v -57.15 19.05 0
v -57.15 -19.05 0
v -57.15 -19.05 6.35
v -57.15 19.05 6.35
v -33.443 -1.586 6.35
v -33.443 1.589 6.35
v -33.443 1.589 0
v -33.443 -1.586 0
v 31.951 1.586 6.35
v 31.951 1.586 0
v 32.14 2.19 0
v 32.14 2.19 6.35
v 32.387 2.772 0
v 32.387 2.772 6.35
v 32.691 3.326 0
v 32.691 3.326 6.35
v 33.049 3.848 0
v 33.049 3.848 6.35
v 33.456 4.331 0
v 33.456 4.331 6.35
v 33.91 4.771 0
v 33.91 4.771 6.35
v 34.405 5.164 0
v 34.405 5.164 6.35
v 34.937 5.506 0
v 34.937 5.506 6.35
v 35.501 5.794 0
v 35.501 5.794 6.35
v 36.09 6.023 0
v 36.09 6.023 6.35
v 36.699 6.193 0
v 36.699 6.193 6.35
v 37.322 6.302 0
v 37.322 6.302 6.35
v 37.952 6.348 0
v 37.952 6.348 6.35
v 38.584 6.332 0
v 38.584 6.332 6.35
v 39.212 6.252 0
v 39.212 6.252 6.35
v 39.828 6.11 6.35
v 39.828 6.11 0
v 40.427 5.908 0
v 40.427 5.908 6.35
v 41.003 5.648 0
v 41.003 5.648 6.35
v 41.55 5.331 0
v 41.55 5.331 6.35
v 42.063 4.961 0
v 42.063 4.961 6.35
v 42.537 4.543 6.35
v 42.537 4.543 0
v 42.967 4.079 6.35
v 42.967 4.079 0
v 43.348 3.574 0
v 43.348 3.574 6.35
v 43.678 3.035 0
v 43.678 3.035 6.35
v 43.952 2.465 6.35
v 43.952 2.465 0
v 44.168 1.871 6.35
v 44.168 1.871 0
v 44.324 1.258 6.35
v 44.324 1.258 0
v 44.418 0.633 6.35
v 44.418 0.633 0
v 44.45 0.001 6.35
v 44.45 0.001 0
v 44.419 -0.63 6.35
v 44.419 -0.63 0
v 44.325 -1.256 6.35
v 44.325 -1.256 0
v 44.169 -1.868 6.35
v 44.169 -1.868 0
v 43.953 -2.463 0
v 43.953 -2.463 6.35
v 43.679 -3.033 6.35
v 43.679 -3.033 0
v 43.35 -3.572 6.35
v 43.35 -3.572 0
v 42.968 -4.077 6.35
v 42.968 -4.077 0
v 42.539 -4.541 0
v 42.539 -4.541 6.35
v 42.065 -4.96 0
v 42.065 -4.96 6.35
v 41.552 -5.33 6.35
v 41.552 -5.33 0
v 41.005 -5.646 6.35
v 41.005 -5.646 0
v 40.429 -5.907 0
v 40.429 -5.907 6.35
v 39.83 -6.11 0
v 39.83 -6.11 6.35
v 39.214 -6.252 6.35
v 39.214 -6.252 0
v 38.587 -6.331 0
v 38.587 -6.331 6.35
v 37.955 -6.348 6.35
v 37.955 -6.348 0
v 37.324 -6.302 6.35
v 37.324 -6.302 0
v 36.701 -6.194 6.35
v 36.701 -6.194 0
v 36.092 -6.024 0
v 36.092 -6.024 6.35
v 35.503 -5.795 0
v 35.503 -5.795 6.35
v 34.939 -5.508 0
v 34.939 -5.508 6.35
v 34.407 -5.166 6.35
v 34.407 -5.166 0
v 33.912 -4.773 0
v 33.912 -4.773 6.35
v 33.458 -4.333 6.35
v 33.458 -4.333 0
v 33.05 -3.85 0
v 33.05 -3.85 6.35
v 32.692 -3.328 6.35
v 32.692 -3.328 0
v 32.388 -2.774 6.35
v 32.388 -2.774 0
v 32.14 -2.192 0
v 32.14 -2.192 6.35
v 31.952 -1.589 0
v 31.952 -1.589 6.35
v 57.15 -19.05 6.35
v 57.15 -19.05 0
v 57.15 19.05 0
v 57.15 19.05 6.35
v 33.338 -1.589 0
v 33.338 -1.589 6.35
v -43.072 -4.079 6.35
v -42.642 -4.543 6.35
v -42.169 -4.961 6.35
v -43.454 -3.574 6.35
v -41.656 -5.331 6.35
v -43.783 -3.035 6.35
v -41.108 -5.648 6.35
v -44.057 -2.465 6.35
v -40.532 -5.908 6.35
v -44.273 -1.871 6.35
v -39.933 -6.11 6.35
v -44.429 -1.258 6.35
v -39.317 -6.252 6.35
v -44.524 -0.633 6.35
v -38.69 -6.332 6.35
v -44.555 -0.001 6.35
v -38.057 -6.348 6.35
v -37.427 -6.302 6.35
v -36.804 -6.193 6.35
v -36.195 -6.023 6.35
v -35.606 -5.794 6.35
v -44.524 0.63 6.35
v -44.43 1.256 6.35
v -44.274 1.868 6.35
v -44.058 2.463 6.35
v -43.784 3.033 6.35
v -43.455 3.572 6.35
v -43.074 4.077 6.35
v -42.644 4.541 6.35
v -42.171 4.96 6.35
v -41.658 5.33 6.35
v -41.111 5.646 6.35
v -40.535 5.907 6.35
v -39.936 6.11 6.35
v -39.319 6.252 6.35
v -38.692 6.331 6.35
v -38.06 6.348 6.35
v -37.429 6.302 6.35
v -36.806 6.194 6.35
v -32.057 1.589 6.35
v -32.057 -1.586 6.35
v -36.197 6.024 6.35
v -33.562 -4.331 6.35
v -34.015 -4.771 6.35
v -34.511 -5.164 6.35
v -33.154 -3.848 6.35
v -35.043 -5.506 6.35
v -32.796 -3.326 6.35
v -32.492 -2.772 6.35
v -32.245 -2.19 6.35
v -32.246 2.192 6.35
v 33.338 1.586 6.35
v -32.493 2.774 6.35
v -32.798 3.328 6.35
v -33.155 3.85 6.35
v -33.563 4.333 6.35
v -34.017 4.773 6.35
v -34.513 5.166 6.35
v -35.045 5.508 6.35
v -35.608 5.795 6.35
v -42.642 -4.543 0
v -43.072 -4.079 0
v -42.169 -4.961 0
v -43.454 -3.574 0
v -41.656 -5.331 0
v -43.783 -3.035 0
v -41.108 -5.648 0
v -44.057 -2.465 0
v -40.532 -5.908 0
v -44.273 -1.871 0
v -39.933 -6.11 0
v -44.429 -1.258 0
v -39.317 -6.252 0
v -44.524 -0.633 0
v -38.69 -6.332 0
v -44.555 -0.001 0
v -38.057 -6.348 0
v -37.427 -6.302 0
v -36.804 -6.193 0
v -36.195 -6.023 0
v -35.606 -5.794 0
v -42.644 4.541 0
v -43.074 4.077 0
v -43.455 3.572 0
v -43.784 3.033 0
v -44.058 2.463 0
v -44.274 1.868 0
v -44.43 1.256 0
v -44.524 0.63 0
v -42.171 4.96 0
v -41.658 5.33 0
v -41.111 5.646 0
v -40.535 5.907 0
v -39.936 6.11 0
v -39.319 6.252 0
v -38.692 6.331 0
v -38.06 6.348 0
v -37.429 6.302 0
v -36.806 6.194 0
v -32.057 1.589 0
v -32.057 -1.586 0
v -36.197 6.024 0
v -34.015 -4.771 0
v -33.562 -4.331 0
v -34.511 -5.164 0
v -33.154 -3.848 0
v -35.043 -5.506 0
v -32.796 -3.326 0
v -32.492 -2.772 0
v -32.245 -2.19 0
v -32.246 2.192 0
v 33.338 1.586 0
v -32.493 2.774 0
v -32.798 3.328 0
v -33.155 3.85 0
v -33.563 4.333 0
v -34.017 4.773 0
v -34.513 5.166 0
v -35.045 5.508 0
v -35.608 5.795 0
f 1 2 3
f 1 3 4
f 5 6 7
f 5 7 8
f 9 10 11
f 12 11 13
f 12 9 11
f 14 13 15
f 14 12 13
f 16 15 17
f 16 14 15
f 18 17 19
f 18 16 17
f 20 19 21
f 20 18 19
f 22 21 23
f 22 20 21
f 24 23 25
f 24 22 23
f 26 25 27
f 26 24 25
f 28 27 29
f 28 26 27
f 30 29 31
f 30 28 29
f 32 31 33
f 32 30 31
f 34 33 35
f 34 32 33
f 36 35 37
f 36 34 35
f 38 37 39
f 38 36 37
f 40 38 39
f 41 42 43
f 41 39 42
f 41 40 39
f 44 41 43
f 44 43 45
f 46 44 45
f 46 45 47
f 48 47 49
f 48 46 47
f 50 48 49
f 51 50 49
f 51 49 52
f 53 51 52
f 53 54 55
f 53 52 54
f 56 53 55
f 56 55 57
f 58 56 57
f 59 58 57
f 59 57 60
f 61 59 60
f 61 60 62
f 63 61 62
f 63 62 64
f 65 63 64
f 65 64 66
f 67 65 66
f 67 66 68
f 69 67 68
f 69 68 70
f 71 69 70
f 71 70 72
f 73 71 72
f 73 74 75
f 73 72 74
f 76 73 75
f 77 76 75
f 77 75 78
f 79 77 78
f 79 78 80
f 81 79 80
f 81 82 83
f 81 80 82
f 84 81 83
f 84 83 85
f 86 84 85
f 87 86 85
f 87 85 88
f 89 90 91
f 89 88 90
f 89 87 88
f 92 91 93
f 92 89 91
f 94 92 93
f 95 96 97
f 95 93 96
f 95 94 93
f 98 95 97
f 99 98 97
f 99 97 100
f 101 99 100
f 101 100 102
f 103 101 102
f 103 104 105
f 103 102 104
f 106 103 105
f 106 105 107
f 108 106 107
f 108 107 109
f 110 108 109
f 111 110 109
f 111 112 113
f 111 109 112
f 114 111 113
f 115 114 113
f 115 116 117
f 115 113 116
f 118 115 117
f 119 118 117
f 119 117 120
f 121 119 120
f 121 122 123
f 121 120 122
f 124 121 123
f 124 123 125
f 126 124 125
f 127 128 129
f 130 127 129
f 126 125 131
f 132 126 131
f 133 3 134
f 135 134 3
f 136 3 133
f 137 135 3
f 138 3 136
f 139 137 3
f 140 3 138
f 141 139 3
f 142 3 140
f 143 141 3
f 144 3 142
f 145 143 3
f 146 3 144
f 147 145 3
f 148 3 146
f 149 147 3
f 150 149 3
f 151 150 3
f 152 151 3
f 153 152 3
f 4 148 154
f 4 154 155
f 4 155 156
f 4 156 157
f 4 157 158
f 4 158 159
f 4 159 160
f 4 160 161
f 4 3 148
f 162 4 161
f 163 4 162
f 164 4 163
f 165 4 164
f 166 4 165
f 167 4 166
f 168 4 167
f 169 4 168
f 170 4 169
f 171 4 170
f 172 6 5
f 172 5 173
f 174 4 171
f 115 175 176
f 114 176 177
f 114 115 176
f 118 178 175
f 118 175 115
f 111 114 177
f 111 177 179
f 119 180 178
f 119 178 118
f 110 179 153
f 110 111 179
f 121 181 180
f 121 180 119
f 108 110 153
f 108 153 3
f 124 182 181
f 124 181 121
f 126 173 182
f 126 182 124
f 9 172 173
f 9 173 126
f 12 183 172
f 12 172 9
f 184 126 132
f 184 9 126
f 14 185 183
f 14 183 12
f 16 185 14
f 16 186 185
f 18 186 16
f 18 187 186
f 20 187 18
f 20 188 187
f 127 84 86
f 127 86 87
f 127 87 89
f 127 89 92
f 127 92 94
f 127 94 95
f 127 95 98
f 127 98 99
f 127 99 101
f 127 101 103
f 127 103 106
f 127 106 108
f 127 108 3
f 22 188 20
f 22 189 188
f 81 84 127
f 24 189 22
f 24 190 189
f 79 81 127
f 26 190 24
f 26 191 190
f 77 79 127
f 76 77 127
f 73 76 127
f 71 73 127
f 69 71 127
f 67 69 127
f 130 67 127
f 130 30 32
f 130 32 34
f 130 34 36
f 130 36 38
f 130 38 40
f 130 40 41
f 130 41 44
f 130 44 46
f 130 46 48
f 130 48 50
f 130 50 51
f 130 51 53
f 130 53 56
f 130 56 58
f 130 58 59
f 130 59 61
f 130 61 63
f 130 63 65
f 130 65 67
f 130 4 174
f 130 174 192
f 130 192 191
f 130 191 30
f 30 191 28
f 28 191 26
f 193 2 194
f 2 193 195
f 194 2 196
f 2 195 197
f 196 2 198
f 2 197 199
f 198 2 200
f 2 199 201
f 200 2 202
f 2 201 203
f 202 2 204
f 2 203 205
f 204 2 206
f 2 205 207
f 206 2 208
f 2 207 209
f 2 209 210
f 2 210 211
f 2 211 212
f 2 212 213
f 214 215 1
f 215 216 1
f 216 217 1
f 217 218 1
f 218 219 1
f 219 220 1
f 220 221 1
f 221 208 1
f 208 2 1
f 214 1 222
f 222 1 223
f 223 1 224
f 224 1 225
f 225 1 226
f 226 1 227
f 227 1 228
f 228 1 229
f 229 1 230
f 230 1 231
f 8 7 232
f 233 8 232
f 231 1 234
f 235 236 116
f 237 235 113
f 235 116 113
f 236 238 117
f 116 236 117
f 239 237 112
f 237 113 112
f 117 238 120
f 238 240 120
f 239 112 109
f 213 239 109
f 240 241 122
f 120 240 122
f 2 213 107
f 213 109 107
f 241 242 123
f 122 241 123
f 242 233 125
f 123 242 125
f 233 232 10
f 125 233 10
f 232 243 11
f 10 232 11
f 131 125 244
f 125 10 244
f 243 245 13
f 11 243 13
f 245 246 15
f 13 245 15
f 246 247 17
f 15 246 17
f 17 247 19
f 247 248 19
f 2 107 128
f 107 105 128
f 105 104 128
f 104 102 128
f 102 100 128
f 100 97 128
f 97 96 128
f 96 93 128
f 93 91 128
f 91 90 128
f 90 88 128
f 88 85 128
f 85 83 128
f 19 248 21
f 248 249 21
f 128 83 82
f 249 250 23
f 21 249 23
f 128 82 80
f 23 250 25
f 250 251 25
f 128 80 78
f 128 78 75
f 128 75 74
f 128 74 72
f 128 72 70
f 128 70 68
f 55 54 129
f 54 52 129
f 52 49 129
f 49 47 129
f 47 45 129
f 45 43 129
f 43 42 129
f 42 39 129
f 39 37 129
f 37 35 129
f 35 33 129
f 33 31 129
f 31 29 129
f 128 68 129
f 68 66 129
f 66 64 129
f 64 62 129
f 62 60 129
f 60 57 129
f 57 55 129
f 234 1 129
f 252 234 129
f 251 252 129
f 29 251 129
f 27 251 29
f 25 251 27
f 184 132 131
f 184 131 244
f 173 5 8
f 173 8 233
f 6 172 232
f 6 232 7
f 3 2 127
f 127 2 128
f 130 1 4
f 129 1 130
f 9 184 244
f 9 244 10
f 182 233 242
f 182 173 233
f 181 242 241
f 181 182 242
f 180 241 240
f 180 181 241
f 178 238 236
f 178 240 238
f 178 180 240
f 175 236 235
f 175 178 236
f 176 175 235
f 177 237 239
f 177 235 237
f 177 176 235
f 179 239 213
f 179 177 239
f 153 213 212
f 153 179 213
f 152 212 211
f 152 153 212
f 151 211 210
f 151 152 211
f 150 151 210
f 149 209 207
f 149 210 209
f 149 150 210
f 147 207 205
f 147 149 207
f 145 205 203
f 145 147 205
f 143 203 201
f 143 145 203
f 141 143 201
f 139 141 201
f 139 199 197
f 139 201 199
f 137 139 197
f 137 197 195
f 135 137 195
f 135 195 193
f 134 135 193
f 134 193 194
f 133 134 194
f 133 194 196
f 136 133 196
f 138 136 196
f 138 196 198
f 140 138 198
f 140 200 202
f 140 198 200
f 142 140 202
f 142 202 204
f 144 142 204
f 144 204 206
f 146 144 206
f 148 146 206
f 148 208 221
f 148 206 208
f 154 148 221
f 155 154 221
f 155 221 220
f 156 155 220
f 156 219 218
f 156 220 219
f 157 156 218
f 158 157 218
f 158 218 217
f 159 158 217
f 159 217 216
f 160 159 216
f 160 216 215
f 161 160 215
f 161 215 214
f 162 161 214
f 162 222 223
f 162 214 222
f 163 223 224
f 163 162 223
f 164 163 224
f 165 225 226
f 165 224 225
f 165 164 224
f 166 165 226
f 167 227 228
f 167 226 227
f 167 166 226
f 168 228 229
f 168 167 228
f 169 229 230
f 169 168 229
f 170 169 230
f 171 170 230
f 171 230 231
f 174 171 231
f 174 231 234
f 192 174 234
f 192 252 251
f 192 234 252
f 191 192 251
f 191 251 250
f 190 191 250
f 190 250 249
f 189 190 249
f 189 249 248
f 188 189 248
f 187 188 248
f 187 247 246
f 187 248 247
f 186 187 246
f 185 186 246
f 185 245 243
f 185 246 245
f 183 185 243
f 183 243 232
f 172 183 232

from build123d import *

# Parameters (mm, degrees)
SKETCH1_W           = 114.3
SKETCH1_H           = 38.1
BOSS_EXTRUDE1_DEPTH = 6.35
CUT_EXTRUDE1_DEPTH  = 61.57513929


with BuildPart() as part:
    # Sketch1 → Boss-Extrude1 (new body)
    with BuildSketch(Plane.XY):
        Rectangle(SKETCH1_W, SKETCH1_H)
    extrude(amount=BOSS_EXTRUDE1_DEPTH)

    # Sketch2 → Cut-Extrude1 (cut, through all)
    with BuildSketch(Plane.XY.offset(6.35)):
        with BuildLine():
            Line((31.95195085, -1.58870754), (33.3375, -1.58870754))
            Line((33.3375, -1.58870754), (33.3375, 1.58629246))
            Line((33.3375, 1.58629246), (31.951327279, 1.58629246))
            ThreePointArc((31.951327279, 1.58629246), (44.449999878, 0.001247142), (31.95195085, -1.58870754))
        make_face()
        with BuildLine():
            Line((-32.057272724, 1.58870754), (-33.442821874, 1.58870754))
            Line((-33.442821874, 1.58870754), (-33.442821874, -1.58629246))
            Line((-33.442821874, -1.58629246), (-32.056649153, -1.58629246))
            ThreePointArc((-32.056649153, -1.58629246), (-44.555321751, -0.001247142), (-32.057272724, 1.58870754))
        make_face()
    extrude(amount=-CUT_EXTRUDE1_DEPTH, mode=Mode.SUBTRACT)


solid = part.part
